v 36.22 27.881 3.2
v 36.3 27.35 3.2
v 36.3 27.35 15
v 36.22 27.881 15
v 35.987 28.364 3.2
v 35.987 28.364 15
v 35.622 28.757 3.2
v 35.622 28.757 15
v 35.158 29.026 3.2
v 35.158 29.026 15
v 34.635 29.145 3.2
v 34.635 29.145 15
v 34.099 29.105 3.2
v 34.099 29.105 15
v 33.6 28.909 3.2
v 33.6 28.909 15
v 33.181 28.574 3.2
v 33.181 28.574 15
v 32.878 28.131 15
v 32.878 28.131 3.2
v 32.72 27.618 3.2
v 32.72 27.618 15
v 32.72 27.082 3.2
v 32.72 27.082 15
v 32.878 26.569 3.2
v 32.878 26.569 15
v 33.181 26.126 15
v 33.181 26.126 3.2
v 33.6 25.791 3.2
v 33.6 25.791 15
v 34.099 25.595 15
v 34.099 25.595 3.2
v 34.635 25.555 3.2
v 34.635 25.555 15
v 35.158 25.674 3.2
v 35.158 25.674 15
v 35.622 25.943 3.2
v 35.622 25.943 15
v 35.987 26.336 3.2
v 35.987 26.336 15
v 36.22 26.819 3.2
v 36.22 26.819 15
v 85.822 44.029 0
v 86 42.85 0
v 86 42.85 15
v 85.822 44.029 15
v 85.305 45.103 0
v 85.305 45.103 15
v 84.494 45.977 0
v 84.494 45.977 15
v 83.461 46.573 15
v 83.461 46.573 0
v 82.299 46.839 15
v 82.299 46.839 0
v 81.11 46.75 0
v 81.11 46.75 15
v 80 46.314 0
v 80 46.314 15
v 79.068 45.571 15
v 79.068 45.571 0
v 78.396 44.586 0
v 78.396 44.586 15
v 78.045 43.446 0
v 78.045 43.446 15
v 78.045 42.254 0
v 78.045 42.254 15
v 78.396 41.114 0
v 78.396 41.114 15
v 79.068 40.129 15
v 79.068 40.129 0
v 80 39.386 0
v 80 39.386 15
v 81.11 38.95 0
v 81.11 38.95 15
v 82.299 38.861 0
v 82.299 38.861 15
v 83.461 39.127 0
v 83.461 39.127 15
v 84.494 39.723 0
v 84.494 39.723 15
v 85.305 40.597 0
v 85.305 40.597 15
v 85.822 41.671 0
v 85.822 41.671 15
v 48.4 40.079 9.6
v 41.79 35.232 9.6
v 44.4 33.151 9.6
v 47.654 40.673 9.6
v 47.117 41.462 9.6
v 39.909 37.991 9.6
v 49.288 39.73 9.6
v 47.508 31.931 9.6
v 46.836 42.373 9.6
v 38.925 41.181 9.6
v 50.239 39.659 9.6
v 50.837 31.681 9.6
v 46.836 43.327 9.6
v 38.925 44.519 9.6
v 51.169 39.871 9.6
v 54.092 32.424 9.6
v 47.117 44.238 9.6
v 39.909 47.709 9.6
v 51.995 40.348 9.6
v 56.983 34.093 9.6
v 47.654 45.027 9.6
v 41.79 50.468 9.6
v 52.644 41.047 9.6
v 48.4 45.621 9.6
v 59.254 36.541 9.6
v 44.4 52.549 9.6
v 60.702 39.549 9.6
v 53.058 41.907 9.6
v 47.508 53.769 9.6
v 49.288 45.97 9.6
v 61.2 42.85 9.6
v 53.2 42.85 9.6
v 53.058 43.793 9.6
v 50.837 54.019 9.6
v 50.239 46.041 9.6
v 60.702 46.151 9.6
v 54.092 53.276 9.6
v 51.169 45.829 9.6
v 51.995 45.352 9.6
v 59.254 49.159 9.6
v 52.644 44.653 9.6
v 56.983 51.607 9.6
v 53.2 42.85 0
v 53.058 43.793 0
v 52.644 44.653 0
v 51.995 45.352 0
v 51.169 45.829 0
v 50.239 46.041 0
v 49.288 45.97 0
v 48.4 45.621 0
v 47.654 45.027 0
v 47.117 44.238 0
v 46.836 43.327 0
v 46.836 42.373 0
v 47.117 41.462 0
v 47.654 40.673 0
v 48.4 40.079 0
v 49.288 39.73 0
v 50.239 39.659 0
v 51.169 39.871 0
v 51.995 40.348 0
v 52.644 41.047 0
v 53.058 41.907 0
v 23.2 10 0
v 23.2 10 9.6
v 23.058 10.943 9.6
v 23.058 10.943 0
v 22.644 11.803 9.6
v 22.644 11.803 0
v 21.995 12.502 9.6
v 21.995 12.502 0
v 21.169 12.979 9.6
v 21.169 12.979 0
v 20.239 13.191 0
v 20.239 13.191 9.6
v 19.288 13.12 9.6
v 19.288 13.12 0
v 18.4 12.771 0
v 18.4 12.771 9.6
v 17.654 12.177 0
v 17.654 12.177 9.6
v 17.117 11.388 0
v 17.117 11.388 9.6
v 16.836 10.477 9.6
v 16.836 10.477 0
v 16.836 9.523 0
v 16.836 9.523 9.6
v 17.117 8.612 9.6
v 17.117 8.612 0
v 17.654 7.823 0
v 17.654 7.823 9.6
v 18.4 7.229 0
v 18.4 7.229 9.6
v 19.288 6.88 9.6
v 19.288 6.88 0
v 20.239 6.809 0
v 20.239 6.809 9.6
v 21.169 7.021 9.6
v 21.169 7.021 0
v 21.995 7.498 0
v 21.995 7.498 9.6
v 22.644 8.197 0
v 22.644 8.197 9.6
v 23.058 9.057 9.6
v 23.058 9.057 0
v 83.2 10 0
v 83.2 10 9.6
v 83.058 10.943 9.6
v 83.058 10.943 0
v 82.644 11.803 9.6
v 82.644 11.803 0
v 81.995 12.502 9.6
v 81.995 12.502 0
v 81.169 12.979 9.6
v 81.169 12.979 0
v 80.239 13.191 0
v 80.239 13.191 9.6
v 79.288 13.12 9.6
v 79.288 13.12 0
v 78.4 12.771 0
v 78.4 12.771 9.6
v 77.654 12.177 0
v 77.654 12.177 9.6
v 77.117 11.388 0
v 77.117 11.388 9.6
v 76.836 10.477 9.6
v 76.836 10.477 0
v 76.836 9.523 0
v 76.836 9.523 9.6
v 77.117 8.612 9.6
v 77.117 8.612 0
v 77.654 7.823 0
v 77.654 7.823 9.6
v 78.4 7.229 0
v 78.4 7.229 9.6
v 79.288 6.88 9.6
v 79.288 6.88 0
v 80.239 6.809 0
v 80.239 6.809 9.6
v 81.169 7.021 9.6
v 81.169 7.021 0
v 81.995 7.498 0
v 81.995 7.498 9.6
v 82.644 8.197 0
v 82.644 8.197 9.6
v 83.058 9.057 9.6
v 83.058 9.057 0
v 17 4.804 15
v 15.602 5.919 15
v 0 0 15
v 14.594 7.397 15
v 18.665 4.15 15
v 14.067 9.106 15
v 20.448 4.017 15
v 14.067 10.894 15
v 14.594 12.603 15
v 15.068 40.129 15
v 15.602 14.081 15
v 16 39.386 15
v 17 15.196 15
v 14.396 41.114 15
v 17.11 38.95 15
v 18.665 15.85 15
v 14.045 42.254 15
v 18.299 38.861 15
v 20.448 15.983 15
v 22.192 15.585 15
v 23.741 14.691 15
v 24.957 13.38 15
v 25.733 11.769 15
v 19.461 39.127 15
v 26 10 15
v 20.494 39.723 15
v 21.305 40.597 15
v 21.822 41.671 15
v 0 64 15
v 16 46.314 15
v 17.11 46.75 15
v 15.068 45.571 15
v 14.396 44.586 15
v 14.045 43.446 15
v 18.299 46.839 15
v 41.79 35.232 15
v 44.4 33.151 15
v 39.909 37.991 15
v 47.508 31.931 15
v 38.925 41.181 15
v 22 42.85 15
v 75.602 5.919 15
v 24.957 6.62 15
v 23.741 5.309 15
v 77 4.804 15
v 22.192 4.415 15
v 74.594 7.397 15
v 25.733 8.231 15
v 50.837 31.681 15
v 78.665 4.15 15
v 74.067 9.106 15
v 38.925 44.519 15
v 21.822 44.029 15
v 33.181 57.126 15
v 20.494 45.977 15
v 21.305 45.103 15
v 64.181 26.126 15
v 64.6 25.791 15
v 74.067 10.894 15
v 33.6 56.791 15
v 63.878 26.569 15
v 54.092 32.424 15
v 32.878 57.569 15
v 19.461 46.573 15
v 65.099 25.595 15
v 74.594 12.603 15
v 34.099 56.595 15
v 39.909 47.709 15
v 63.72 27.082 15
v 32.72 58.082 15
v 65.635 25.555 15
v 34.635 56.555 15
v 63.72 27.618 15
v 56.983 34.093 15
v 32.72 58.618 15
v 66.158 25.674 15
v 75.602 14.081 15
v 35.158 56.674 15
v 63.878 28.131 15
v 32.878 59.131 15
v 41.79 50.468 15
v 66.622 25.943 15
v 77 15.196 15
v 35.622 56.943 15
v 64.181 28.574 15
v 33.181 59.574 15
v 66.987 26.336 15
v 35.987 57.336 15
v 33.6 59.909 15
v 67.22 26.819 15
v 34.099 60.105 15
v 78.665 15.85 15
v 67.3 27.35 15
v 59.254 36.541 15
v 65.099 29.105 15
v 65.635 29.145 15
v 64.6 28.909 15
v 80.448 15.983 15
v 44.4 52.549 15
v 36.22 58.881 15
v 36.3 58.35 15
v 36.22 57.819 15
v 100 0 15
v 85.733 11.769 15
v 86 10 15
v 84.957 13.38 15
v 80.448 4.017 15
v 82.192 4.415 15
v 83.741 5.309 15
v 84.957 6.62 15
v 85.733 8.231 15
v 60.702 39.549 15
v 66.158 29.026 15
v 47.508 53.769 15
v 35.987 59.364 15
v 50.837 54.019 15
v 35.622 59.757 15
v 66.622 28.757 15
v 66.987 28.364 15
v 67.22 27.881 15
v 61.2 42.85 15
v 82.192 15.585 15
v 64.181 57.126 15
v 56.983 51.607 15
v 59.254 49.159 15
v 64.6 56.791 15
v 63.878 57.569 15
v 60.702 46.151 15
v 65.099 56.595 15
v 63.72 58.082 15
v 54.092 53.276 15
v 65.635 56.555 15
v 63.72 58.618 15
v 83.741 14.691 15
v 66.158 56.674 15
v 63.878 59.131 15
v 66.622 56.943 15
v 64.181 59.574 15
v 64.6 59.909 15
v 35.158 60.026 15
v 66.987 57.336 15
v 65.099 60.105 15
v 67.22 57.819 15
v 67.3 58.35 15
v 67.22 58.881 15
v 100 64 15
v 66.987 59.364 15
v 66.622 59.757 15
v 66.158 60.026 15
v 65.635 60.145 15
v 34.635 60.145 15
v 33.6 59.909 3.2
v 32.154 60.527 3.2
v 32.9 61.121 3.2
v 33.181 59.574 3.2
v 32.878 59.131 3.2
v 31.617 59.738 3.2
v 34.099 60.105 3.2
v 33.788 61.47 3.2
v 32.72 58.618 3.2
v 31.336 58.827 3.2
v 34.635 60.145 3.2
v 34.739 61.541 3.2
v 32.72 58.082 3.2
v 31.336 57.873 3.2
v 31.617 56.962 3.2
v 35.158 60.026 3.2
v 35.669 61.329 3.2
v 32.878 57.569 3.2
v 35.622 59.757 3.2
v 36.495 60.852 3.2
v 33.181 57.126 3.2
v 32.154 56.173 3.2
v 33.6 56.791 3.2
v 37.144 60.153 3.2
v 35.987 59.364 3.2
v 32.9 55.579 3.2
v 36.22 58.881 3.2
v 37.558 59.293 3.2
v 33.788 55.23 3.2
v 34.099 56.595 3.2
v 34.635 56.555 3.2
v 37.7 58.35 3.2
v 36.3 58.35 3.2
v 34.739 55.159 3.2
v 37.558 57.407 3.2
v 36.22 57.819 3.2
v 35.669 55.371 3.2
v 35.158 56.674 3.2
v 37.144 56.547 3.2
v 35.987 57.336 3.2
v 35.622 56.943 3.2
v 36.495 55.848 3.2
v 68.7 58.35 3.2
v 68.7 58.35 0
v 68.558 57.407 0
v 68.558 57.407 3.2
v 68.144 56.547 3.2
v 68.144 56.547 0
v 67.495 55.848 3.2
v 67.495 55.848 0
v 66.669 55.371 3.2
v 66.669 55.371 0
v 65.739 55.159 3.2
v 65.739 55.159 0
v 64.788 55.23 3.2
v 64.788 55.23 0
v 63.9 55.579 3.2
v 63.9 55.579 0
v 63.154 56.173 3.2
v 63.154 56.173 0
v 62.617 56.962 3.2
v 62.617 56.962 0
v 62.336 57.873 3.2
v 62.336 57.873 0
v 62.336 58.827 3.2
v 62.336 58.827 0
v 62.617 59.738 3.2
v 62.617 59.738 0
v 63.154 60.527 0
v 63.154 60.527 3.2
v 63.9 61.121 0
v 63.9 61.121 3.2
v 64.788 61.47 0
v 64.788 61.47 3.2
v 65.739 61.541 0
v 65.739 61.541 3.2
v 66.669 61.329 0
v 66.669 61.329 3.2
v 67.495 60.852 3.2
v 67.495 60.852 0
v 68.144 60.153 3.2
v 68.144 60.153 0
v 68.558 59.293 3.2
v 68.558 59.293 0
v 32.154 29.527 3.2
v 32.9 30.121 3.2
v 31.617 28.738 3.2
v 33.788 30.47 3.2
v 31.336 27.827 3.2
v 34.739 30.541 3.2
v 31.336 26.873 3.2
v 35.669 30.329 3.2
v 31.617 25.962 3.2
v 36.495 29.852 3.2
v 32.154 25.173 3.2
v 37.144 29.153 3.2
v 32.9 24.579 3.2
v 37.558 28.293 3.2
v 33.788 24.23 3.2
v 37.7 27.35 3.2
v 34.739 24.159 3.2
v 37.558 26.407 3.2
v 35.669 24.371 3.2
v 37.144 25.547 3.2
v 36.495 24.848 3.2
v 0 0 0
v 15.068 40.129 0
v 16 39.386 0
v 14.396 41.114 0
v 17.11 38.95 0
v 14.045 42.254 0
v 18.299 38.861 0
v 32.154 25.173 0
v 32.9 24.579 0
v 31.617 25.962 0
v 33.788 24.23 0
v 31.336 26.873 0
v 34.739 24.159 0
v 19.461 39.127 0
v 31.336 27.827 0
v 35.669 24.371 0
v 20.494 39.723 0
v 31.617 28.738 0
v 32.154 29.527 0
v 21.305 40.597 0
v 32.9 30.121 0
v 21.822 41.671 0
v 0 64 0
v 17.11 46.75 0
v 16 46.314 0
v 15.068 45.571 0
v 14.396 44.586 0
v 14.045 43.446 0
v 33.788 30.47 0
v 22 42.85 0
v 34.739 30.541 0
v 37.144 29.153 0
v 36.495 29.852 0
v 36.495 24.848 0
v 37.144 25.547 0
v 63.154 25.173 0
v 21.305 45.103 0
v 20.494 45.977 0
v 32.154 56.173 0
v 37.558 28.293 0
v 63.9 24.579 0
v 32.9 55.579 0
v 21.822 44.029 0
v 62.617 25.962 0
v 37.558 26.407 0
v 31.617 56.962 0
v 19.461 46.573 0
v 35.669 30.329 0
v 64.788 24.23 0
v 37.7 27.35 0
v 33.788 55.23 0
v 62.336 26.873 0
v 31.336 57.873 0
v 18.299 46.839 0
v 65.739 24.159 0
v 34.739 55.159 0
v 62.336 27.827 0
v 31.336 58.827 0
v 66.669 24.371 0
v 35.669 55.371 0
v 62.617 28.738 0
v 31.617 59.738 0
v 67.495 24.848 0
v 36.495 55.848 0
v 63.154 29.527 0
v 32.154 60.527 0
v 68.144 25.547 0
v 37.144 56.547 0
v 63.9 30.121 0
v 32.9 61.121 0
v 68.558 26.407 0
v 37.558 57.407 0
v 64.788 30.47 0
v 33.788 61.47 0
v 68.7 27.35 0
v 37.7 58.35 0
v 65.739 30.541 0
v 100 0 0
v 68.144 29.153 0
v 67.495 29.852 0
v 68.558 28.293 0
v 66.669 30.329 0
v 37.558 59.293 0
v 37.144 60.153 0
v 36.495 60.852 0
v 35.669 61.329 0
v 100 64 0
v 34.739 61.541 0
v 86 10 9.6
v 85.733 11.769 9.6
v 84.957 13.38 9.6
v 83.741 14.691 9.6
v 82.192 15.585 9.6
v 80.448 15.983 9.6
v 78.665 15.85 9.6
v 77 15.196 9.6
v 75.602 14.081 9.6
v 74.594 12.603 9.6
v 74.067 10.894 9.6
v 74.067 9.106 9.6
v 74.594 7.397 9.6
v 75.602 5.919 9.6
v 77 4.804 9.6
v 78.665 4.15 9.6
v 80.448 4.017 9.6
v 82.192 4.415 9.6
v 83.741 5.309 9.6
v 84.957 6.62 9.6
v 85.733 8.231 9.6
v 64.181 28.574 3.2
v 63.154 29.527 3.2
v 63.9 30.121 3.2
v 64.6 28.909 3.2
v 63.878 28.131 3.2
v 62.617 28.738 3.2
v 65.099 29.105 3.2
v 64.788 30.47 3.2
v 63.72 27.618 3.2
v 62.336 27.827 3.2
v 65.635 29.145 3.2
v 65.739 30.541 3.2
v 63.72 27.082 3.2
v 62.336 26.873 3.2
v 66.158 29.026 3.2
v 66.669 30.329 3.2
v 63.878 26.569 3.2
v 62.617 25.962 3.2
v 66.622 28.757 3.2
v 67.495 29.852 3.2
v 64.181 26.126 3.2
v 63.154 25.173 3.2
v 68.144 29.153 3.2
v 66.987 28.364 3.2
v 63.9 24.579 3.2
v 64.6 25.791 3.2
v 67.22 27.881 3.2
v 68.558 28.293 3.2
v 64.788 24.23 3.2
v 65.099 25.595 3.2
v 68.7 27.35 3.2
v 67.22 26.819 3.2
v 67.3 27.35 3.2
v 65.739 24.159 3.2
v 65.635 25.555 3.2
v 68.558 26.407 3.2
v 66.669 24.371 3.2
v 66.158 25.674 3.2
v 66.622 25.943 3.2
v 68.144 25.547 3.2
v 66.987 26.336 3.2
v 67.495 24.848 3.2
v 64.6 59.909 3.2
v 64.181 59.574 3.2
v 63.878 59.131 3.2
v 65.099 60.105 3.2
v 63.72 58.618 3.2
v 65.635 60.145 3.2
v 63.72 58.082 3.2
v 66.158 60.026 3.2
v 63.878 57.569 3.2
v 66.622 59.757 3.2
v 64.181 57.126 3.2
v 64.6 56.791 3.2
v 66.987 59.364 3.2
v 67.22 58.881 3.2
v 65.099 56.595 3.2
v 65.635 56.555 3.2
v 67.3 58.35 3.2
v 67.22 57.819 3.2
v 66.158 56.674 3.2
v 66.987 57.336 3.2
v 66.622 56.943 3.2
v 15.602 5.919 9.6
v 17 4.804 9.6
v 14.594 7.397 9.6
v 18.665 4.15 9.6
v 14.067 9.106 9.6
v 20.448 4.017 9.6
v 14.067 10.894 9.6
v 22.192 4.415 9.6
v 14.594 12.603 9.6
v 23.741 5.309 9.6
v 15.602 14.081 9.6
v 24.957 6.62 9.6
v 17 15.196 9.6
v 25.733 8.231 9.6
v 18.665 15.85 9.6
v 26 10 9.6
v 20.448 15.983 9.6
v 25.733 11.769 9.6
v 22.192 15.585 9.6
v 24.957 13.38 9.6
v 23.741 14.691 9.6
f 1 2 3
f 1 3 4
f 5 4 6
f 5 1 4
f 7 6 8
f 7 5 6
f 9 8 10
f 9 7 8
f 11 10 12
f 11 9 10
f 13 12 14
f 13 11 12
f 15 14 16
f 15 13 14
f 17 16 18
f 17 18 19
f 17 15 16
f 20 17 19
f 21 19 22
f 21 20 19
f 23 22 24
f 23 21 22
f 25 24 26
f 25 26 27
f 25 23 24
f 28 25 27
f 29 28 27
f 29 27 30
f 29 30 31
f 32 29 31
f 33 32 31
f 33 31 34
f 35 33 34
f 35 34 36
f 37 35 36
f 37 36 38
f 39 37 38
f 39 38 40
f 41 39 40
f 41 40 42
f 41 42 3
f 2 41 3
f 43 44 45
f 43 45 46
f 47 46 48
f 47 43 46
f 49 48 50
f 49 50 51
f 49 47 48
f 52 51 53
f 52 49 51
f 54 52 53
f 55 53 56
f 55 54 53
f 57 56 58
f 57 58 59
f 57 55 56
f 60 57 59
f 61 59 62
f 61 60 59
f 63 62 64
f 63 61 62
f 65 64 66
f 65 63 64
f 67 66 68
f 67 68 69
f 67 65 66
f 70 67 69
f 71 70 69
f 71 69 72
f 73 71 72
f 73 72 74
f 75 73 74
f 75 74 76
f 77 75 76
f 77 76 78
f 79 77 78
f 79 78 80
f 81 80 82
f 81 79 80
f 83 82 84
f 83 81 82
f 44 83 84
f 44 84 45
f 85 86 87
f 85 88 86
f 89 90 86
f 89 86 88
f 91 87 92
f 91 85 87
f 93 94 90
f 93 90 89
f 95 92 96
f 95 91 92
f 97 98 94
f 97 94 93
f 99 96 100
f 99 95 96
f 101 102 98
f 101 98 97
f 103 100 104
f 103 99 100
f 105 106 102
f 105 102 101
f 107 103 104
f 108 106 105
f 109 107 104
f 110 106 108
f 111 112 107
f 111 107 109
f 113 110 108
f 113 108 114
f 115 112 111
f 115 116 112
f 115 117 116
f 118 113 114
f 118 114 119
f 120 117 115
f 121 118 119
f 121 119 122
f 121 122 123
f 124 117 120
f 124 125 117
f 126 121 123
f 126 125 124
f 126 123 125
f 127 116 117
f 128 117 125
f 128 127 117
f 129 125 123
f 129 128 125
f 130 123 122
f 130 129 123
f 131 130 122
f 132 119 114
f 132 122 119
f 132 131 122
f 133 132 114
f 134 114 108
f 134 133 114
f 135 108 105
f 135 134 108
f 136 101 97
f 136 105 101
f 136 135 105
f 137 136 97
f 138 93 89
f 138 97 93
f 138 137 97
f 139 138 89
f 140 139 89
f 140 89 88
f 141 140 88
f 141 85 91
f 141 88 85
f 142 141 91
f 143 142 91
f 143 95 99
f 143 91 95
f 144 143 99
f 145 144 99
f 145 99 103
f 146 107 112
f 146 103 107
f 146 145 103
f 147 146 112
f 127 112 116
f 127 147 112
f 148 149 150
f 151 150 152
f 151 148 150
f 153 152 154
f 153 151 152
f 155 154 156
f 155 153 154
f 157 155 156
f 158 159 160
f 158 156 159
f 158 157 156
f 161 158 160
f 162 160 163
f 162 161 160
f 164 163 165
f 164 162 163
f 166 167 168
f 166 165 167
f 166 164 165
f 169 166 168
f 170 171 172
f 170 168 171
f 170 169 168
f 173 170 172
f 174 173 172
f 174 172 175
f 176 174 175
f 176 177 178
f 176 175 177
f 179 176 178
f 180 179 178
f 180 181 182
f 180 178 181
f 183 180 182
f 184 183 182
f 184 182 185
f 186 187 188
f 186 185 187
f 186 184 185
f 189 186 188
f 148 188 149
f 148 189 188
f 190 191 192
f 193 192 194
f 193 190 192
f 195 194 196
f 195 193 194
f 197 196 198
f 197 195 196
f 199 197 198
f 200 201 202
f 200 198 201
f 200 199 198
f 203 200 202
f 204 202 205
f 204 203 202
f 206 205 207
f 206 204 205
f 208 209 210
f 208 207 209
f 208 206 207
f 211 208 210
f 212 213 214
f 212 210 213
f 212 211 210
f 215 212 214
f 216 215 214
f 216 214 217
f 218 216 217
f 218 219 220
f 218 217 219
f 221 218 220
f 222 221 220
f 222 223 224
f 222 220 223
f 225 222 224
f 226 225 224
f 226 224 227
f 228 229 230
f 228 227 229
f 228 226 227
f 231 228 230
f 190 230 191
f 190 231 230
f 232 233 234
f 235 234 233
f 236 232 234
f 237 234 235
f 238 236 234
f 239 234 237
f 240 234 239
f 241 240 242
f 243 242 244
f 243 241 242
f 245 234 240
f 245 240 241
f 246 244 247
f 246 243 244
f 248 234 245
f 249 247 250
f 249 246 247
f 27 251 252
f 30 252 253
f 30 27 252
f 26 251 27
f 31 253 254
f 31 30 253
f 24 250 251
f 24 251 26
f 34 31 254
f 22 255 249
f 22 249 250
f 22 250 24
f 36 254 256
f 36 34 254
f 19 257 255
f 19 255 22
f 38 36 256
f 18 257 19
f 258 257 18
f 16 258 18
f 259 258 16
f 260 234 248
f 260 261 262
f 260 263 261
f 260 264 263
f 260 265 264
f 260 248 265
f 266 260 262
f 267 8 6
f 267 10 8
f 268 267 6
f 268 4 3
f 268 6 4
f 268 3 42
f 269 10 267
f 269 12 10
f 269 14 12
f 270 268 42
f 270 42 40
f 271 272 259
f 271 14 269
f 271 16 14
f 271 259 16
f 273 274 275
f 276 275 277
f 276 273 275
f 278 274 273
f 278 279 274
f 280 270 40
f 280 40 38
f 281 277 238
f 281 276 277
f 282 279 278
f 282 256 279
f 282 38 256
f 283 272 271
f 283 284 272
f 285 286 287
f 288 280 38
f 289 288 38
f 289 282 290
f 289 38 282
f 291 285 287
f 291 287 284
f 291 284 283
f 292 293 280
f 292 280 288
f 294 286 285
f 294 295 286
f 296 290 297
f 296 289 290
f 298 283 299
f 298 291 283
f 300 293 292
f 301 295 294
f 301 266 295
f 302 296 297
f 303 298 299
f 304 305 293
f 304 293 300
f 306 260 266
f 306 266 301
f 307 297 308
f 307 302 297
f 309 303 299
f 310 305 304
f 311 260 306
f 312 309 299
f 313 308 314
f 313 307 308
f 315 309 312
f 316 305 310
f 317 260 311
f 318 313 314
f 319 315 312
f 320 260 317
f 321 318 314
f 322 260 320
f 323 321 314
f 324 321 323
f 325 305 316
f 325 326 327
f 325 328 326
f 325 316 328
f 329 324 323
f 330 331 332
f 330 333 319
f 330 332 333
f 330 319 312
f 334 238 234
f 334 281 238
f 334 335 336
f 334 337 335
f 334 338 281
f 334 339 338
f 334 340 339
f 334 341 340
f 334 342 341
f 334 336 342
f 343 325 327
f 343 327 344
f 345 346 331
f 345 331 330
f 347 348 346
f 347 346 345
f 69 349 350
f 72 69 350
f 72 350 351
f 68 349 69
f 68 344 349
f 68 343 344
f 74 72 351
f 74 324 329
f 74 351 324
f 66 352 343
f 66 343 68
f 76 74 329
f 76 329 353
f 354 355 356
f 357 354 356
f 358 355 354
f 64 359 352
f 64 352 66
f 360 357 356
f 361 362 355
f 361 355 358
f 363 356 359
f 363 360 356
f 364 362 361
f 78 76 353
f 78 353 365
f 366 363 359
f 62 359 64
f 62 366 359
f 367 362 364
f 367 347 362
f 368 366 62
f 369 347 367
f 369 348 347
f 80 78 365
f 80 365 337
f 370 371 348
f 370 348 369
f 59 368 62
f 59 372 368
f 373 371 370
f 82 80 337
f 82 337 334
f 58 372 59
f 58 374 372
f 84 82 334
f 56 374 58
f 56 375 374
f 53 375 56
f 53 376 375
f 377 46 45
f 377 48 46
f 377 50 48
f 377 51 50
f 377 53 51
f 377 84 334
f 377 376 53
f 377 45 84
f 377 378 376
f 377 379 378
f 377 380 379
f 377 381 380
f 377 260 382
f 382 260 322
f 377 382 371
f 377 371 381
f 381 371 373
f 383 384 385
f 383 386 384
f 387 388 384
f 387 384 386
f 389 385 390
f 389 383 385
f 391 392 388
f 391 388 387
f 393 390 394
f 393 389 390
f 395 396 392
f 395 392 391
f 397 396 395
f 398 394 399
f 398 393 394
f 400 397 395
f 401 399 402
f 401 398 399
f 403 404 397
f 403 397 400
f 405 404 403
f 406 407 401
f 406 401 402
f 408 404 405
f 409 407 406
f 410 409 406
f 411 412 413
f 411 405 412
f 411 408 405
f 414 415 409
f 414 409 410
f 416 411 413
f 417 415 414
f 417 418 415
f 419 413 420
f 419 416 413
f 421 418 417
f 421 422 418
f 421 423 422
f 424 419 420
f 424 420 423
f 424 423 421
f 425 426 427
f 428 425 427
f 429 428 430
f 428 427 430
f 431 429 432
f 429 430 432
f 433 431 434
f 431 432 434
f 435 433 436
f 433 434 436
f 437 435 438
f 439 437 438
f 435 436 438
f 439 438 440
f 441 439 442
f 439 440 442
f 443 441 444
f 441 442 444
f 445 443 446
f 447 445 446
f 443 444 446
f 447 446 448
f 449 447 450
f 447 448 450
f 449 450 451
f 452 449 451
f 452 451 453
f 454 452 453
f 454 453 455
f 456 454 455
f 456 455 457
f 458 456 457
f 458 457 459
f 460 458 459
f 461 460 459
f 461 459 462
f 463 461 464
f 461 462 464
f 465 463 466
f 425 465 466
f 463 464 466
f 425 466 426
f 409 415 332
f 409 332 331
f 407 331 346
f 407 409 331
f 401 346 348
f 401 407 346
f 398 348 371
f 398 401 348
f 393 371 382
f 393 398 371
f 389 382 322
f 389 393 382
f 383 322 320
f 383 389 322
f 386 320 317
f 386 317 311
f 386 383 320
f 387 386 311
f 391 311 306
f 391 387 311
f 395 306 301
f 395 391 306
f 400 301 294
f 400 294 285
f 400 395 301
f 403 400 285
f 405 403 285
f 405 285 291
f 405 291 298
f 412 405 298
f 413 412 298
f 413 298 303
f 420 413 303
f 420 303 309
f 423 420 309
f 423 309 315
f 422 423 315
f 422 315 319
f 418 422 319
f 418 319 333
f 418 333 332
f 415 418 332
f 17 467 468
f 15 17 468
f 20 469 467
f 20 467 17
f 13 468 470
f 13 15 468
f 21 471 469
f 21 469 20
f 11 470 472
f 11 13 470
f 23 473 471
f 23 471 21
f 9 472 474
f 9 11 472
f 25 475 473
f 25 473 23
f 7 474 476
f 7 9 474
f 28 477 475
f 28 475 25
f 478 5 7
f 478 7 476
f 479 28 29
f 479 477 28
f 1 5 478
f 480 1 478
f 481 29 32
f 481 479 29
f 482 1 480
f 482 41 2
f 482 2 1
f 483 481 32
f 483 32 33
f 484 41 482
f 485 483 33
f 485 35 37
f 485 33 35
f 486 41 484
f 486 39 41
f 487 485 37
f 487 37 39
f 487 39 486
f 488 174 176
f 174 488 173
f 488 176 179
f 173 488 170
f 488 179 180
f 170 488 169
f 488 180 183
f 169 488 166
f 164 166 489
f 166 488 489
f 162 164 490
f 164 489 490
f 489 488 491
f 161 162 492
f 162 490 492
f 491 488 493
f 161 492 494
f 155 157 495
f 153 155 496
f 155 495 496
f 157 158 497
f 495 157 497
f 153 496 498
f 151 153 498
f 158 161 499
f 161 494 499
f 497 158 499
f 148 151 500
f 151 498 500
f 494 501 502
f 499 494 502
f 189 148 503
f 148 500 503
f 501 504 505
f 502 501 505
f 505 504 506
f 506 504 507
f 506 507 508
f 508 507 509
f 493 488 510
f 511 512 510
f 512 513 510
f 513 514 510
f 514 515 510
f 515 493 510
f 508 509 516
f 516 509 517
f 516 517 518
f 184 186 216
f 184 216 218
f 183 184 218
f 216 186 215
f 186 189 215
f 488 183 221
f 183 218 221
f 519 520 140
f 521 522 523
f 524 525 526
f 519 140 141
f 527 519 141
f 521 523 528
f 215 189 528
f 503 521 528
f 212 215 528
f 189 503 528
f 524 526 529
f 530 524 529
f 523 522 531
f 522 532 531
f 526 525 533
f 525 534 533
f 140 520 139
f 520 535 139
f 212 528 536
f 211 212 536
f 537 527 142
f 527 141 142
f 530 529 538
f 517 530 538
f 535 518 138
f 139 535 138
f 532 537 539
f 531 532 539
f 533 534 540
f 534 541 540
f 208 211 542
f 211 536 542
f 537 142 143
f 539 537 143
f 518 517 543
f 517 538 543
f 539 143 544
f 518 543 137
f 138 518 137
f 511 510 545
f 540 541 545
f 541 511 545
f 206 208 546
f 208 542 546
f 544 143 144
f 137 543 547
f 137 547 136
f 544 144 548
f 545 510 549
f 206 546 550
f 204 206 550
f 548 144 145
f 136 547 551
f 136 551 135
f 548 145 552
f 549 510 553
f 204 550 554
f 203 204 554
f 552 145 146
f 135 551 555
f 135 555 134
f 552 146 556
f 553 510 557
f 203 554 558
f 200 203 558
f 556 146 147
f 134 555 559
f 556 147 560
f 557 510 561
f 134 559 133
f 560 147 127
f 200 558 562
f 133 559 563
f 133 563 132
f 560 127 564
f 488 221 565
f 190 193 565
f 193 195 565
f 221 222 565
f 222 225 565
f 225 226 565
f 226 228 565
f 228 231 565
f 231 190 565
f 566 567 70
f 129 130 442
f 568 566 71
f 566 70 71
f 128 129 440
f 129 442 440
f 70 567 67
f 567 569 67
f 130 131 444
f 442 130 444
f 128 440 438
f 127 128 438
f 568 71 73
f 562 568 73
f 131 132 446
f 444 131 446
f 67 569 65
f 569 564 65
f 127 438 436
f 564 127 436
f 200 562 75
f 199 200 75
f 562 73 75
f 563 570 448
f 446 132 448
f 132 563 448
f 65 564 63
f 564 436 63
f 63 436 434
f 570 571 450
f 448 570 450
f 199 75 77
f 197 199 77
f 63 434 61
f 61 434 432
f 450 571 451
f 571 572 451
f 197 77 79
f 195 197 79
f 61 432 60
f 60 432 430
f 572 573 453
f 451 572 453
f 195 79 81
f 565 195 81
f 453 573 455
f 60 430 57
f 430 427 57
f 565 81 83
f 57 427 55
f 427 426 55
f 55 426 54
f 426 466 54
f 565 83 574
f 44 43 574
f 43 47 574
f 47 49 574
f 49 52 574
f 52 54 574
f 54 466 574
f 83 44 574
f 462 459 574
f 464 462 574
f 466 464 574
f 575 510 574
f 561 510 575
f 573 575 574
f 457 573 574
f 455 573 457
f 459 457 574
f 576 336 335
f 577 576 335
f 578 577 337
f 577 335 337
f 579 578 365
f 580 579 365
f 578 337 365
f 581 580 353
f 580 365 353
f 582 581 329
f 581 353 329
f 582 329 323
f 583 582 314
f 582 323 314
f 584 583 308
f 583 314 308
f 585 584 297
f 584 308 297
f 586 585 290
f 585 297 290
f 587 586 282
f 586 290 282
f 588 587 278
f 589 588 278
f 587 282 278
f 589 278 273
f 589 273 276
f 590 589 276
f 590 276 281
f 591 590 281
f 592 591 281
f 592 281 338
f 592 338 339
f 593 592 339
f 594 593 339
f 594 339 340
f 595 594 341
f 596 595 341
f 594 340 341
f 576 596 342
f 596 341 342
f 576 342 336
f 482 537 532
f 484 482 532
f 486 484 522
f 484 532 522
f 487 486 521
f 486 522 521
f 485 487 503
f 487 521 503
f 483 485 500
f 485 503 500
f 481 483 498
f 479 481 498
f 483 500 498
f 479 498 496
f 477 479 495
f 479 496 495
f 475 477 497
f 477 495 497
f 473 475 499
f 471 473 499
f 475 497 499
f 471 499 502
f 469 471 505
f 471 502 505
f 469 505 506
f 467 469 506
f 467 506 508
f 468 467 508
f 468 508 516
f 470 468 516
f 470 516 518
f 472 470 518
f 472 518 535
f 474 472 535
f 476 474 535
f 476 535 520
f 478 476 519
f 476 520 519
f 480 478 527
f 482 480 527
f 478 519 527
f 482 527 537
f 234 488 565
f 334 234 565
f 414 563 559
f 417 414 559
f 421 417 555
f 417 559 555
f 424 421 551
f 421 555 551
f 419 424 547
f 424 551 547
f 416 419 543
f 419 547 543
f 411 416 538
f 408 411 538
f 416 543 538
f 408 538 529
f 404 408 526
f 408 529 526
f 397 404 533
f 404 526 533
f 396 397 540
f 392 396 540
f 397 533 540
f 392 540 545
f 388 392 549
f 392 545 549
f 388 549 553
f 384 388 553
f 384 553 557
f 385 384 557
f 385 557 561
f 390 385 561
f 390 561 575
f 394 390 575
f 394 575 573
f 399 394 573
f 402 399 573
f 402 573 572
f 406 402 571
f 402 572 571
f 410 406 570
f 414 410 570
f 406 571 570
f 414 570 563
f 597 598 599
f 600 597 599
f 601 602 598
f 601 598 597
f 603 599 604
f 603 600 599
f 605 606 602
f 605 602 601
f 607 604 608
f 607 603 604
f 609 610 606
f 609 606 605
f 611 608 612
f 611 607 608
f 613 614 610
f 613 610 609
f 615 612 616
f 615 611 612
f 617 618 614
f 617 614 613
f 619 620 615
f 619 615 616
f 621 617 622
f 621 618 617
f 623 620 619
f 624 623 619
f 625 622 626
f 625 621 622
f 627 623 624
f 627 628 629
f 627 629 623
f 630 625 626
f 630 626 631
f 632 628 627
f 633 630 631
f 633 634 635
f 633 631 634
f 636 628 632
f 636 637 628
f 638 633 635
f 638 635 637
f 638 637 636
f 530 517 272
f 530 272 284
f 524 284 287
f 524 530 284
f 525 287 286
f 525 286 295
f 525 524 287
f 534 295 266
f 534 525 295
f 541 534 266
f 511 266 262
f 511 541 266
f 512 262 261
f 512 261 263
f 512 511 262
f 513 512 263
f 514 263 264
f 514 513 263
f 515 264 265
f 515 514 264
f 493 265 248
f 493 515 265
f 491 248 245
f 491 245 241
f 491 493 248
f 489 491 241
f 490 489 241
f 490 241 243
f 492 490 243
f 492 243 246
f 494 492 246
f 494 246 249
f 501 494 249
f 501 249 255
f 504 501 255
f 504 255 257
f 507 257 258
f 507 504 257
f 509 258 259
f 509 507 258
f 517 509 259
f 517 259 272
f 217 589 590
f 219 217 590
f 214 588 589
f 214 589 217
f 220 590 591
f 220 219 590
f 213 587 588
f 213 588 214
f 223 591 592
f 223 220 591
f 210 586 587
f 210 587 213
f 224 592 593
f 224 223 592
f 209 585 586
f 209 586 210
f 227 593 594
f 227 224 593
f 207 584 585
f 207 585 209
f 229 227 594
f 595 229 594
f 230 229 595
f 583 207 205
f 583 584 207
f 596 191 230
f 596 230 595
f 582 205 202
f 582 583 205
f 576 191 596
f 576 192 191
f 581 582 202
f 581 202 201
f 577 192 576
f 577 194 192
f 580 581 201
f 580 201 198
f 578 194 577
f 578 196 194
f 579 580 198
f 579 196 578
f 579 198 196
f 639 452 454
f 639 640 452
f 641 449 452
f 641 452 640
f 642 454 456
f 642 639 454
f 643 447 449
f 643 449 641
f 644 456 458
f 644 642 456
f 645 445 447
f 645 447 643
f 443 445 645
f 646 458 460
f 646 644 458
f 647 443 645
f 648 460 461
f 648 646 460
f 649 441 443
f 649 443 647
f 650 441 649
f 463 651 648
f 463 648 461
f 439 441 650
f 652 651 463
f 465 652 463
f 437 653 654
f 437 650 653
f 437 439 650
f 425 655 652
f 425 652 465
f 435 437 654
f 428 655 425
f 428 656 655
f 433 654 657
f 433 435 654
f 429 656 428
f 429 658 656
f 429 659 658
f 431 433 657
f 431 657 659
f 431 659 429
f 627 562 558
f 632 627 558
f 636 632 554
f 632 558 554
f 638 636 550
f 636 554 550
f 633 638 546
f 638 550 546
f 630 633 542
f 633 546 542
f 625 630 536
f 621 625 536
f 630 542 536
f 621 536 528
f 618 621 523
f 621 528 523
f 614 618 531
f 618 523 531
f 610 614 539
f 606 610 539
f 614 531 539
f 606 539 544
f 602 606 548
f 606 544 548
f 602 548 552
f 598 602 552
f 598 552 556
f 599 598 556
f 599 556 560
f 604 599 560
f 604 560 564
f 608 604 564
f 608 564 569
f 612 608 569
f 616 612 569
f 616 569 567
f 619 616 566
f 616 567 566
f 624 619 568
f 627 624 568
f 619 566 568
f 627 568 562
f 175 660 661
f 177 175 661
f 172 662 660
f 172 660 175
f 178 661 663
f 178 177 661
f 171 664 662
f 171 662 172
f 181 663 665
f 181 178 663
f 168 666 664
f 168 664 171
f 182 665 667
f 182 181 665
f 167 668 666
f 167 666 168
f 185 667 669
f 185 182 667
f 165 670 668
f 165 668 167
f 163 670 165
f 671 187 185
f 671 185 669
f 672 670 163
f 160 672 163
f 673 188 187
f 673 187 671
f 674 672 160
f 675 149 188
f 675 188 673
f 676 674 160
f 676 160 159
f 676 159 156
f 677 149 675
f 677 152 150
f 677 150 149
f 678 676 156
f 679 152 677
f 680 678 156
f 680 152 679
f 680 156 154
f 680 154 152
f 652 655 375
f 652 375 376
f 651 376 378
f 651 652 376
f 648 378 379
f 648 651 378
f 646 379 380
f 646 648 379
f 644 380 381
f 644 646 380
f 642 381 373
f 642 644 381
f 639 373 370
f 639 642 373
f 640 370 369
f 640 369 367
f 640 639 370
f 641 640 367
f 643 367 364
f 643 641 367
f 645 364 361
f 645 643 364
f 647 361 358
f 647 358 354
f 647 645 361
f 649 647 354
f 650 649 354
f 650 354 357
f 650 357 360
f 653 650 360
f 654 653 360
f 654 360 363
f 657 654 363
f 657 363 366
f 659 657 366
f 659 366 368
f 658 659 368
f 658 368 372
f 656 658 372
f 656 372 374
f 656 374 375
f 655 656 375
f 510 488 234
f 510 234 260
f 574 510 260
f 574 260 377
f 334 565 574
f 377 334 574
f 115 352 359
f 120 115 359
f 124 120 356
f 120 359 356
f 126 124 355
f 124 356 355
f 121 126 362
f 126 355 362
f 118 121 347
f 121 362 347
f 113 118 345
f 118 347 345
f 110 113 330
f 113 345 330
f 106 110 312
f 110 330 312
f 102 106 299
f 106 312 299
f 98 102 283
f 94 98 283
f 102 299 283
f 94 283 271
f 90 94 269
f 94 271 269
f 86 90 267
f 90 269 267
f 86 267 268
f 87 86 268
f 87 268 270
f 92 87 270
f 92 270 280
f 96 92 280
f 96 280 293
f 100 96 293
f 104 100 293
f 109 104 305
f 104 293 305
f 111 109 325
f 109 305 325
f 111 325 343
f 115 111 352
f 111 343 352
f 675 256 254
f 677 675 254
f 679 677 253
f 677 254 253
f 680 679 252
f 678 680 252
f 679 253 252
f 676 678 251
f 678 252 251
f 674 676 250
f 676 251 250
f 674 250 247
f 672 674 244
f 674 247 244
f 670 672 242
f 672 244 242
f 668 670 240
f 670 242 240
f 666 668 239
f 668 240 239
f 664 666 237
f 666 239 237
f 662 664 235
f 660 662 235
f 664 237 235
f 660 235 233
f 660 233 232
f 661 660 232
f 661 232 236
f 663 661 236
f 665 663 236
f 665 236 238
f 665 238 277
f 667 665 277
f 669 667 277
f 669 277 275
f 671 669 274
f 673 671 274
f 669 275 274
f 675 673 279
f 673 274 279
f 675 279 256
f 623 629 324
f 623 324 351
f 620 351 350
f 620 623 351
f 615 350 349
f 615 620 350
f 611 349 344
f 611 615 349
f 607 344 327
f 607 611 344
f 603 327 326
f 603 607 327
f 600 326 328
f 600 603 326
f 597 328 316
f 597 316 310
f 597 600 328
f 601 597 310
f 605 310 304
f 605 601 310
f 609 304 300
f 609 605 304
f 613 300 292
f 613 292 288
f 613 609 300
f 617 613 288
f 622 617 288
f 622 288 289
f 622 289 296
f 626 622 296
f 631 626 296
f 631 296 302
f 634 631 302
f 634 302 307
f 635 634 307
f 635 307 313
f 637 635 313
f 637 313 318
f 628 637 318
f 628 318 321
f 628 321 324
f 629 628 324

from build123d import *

# Parameters (mm, degrees)
SKETCH_W        = 100
SKETCH_H        = 64
SKETCH_R        = 3.2
SKETCH_R_2      = 1.8
SKETCH_R_3      = 4
PAD_DEPTH       = 15
SKETCH001_R     = 11.2
SKETCH001_R_2   = 6
POCKET_DEPTH    = 5.4
SKETCH002_R     = 3.2
POCKET001_DEPTH = 3.2


with BuildPart() as part:
    # Sketch → Pad (new body)
    with BuildSketch(Plane.XY):
        with Locations((50, 32)):
            Rectangle(SKETCH_W, SKETCH_H)
        with Locations((50, 42.85)):
            Circle(SKETCH_R, mode=Mode.SUBTRACT)
        with Locations((65.5, 58.35)):
            Circle(SKETCH_R_2, mode=Mode.SUBTRACT)
        with Locations((65.5, 27.35)):
            Circle(SKETCH_R_2, mode=Mode.SUBTRACT)
        with Locations((34.5, 27.35)):
            Circle(SKETCH_R_2, mode=Mode.SUBTRACT)
        with Locations((34.5, 58.35)):
            Circle(SKETCH_R_2, mode=Mode.SUBTRACT)
        with Locations((20, 10)):
            Circle(SKETCH_R, mode=Mode.SUBTRACT)
        with Locations((80, 10)):
            Circle(SKETCH_R, mode=Mode.SUBTRACT)
        with Locations((82, 42.85)):
            Circle(SKETCH_R_3, mode=Mode.SUBTRACT)
        with Locations((18, 42.85)):
            Circle(SKETCH_R_3, mode=Mode.SUBTRACT)
    extrude(amount=PAD_DEPTH)

    # Sketch001 (on Face15 of Pad) → Pocket (cut)
    with BuildSketch(Plane.XY.offset(15)):
        with Locations((50, 42.85)):
            Circle(SKETCH001_R)
        with Locations((20, 10)):
            Circle(SKETCH001_R_2)
        with Locations((80, 10)):
            Circle(SKETCH001_R_2)
    extrude(amount=-POCKET_DEPTH, mode=Mode.SUBTRACT)

    # Sketch002 (on Face4 of Pocket) → Pocket001 (cut)
    with BuildSketch(Plane(origin=(0, 0, 0), x_dir=(1, 0, 0), z_dir=(0, 0, -1))):
        with Locations((34.5, -27.35)):
            Circle(SKETCH002_R)
        with Locations((65.5, -27.35)):
            Circle(SKETCH002_R)
        with Locations((34.5, -58.35)):
            Circle(SKETCH002_R)
        with Locations((65.5, -58.35)):
            Circle(SKETCH002_R)
    extrude(amount=-POCKET001_DEPTH, mode=Mode.SUBTRACT)


solid = part.part
